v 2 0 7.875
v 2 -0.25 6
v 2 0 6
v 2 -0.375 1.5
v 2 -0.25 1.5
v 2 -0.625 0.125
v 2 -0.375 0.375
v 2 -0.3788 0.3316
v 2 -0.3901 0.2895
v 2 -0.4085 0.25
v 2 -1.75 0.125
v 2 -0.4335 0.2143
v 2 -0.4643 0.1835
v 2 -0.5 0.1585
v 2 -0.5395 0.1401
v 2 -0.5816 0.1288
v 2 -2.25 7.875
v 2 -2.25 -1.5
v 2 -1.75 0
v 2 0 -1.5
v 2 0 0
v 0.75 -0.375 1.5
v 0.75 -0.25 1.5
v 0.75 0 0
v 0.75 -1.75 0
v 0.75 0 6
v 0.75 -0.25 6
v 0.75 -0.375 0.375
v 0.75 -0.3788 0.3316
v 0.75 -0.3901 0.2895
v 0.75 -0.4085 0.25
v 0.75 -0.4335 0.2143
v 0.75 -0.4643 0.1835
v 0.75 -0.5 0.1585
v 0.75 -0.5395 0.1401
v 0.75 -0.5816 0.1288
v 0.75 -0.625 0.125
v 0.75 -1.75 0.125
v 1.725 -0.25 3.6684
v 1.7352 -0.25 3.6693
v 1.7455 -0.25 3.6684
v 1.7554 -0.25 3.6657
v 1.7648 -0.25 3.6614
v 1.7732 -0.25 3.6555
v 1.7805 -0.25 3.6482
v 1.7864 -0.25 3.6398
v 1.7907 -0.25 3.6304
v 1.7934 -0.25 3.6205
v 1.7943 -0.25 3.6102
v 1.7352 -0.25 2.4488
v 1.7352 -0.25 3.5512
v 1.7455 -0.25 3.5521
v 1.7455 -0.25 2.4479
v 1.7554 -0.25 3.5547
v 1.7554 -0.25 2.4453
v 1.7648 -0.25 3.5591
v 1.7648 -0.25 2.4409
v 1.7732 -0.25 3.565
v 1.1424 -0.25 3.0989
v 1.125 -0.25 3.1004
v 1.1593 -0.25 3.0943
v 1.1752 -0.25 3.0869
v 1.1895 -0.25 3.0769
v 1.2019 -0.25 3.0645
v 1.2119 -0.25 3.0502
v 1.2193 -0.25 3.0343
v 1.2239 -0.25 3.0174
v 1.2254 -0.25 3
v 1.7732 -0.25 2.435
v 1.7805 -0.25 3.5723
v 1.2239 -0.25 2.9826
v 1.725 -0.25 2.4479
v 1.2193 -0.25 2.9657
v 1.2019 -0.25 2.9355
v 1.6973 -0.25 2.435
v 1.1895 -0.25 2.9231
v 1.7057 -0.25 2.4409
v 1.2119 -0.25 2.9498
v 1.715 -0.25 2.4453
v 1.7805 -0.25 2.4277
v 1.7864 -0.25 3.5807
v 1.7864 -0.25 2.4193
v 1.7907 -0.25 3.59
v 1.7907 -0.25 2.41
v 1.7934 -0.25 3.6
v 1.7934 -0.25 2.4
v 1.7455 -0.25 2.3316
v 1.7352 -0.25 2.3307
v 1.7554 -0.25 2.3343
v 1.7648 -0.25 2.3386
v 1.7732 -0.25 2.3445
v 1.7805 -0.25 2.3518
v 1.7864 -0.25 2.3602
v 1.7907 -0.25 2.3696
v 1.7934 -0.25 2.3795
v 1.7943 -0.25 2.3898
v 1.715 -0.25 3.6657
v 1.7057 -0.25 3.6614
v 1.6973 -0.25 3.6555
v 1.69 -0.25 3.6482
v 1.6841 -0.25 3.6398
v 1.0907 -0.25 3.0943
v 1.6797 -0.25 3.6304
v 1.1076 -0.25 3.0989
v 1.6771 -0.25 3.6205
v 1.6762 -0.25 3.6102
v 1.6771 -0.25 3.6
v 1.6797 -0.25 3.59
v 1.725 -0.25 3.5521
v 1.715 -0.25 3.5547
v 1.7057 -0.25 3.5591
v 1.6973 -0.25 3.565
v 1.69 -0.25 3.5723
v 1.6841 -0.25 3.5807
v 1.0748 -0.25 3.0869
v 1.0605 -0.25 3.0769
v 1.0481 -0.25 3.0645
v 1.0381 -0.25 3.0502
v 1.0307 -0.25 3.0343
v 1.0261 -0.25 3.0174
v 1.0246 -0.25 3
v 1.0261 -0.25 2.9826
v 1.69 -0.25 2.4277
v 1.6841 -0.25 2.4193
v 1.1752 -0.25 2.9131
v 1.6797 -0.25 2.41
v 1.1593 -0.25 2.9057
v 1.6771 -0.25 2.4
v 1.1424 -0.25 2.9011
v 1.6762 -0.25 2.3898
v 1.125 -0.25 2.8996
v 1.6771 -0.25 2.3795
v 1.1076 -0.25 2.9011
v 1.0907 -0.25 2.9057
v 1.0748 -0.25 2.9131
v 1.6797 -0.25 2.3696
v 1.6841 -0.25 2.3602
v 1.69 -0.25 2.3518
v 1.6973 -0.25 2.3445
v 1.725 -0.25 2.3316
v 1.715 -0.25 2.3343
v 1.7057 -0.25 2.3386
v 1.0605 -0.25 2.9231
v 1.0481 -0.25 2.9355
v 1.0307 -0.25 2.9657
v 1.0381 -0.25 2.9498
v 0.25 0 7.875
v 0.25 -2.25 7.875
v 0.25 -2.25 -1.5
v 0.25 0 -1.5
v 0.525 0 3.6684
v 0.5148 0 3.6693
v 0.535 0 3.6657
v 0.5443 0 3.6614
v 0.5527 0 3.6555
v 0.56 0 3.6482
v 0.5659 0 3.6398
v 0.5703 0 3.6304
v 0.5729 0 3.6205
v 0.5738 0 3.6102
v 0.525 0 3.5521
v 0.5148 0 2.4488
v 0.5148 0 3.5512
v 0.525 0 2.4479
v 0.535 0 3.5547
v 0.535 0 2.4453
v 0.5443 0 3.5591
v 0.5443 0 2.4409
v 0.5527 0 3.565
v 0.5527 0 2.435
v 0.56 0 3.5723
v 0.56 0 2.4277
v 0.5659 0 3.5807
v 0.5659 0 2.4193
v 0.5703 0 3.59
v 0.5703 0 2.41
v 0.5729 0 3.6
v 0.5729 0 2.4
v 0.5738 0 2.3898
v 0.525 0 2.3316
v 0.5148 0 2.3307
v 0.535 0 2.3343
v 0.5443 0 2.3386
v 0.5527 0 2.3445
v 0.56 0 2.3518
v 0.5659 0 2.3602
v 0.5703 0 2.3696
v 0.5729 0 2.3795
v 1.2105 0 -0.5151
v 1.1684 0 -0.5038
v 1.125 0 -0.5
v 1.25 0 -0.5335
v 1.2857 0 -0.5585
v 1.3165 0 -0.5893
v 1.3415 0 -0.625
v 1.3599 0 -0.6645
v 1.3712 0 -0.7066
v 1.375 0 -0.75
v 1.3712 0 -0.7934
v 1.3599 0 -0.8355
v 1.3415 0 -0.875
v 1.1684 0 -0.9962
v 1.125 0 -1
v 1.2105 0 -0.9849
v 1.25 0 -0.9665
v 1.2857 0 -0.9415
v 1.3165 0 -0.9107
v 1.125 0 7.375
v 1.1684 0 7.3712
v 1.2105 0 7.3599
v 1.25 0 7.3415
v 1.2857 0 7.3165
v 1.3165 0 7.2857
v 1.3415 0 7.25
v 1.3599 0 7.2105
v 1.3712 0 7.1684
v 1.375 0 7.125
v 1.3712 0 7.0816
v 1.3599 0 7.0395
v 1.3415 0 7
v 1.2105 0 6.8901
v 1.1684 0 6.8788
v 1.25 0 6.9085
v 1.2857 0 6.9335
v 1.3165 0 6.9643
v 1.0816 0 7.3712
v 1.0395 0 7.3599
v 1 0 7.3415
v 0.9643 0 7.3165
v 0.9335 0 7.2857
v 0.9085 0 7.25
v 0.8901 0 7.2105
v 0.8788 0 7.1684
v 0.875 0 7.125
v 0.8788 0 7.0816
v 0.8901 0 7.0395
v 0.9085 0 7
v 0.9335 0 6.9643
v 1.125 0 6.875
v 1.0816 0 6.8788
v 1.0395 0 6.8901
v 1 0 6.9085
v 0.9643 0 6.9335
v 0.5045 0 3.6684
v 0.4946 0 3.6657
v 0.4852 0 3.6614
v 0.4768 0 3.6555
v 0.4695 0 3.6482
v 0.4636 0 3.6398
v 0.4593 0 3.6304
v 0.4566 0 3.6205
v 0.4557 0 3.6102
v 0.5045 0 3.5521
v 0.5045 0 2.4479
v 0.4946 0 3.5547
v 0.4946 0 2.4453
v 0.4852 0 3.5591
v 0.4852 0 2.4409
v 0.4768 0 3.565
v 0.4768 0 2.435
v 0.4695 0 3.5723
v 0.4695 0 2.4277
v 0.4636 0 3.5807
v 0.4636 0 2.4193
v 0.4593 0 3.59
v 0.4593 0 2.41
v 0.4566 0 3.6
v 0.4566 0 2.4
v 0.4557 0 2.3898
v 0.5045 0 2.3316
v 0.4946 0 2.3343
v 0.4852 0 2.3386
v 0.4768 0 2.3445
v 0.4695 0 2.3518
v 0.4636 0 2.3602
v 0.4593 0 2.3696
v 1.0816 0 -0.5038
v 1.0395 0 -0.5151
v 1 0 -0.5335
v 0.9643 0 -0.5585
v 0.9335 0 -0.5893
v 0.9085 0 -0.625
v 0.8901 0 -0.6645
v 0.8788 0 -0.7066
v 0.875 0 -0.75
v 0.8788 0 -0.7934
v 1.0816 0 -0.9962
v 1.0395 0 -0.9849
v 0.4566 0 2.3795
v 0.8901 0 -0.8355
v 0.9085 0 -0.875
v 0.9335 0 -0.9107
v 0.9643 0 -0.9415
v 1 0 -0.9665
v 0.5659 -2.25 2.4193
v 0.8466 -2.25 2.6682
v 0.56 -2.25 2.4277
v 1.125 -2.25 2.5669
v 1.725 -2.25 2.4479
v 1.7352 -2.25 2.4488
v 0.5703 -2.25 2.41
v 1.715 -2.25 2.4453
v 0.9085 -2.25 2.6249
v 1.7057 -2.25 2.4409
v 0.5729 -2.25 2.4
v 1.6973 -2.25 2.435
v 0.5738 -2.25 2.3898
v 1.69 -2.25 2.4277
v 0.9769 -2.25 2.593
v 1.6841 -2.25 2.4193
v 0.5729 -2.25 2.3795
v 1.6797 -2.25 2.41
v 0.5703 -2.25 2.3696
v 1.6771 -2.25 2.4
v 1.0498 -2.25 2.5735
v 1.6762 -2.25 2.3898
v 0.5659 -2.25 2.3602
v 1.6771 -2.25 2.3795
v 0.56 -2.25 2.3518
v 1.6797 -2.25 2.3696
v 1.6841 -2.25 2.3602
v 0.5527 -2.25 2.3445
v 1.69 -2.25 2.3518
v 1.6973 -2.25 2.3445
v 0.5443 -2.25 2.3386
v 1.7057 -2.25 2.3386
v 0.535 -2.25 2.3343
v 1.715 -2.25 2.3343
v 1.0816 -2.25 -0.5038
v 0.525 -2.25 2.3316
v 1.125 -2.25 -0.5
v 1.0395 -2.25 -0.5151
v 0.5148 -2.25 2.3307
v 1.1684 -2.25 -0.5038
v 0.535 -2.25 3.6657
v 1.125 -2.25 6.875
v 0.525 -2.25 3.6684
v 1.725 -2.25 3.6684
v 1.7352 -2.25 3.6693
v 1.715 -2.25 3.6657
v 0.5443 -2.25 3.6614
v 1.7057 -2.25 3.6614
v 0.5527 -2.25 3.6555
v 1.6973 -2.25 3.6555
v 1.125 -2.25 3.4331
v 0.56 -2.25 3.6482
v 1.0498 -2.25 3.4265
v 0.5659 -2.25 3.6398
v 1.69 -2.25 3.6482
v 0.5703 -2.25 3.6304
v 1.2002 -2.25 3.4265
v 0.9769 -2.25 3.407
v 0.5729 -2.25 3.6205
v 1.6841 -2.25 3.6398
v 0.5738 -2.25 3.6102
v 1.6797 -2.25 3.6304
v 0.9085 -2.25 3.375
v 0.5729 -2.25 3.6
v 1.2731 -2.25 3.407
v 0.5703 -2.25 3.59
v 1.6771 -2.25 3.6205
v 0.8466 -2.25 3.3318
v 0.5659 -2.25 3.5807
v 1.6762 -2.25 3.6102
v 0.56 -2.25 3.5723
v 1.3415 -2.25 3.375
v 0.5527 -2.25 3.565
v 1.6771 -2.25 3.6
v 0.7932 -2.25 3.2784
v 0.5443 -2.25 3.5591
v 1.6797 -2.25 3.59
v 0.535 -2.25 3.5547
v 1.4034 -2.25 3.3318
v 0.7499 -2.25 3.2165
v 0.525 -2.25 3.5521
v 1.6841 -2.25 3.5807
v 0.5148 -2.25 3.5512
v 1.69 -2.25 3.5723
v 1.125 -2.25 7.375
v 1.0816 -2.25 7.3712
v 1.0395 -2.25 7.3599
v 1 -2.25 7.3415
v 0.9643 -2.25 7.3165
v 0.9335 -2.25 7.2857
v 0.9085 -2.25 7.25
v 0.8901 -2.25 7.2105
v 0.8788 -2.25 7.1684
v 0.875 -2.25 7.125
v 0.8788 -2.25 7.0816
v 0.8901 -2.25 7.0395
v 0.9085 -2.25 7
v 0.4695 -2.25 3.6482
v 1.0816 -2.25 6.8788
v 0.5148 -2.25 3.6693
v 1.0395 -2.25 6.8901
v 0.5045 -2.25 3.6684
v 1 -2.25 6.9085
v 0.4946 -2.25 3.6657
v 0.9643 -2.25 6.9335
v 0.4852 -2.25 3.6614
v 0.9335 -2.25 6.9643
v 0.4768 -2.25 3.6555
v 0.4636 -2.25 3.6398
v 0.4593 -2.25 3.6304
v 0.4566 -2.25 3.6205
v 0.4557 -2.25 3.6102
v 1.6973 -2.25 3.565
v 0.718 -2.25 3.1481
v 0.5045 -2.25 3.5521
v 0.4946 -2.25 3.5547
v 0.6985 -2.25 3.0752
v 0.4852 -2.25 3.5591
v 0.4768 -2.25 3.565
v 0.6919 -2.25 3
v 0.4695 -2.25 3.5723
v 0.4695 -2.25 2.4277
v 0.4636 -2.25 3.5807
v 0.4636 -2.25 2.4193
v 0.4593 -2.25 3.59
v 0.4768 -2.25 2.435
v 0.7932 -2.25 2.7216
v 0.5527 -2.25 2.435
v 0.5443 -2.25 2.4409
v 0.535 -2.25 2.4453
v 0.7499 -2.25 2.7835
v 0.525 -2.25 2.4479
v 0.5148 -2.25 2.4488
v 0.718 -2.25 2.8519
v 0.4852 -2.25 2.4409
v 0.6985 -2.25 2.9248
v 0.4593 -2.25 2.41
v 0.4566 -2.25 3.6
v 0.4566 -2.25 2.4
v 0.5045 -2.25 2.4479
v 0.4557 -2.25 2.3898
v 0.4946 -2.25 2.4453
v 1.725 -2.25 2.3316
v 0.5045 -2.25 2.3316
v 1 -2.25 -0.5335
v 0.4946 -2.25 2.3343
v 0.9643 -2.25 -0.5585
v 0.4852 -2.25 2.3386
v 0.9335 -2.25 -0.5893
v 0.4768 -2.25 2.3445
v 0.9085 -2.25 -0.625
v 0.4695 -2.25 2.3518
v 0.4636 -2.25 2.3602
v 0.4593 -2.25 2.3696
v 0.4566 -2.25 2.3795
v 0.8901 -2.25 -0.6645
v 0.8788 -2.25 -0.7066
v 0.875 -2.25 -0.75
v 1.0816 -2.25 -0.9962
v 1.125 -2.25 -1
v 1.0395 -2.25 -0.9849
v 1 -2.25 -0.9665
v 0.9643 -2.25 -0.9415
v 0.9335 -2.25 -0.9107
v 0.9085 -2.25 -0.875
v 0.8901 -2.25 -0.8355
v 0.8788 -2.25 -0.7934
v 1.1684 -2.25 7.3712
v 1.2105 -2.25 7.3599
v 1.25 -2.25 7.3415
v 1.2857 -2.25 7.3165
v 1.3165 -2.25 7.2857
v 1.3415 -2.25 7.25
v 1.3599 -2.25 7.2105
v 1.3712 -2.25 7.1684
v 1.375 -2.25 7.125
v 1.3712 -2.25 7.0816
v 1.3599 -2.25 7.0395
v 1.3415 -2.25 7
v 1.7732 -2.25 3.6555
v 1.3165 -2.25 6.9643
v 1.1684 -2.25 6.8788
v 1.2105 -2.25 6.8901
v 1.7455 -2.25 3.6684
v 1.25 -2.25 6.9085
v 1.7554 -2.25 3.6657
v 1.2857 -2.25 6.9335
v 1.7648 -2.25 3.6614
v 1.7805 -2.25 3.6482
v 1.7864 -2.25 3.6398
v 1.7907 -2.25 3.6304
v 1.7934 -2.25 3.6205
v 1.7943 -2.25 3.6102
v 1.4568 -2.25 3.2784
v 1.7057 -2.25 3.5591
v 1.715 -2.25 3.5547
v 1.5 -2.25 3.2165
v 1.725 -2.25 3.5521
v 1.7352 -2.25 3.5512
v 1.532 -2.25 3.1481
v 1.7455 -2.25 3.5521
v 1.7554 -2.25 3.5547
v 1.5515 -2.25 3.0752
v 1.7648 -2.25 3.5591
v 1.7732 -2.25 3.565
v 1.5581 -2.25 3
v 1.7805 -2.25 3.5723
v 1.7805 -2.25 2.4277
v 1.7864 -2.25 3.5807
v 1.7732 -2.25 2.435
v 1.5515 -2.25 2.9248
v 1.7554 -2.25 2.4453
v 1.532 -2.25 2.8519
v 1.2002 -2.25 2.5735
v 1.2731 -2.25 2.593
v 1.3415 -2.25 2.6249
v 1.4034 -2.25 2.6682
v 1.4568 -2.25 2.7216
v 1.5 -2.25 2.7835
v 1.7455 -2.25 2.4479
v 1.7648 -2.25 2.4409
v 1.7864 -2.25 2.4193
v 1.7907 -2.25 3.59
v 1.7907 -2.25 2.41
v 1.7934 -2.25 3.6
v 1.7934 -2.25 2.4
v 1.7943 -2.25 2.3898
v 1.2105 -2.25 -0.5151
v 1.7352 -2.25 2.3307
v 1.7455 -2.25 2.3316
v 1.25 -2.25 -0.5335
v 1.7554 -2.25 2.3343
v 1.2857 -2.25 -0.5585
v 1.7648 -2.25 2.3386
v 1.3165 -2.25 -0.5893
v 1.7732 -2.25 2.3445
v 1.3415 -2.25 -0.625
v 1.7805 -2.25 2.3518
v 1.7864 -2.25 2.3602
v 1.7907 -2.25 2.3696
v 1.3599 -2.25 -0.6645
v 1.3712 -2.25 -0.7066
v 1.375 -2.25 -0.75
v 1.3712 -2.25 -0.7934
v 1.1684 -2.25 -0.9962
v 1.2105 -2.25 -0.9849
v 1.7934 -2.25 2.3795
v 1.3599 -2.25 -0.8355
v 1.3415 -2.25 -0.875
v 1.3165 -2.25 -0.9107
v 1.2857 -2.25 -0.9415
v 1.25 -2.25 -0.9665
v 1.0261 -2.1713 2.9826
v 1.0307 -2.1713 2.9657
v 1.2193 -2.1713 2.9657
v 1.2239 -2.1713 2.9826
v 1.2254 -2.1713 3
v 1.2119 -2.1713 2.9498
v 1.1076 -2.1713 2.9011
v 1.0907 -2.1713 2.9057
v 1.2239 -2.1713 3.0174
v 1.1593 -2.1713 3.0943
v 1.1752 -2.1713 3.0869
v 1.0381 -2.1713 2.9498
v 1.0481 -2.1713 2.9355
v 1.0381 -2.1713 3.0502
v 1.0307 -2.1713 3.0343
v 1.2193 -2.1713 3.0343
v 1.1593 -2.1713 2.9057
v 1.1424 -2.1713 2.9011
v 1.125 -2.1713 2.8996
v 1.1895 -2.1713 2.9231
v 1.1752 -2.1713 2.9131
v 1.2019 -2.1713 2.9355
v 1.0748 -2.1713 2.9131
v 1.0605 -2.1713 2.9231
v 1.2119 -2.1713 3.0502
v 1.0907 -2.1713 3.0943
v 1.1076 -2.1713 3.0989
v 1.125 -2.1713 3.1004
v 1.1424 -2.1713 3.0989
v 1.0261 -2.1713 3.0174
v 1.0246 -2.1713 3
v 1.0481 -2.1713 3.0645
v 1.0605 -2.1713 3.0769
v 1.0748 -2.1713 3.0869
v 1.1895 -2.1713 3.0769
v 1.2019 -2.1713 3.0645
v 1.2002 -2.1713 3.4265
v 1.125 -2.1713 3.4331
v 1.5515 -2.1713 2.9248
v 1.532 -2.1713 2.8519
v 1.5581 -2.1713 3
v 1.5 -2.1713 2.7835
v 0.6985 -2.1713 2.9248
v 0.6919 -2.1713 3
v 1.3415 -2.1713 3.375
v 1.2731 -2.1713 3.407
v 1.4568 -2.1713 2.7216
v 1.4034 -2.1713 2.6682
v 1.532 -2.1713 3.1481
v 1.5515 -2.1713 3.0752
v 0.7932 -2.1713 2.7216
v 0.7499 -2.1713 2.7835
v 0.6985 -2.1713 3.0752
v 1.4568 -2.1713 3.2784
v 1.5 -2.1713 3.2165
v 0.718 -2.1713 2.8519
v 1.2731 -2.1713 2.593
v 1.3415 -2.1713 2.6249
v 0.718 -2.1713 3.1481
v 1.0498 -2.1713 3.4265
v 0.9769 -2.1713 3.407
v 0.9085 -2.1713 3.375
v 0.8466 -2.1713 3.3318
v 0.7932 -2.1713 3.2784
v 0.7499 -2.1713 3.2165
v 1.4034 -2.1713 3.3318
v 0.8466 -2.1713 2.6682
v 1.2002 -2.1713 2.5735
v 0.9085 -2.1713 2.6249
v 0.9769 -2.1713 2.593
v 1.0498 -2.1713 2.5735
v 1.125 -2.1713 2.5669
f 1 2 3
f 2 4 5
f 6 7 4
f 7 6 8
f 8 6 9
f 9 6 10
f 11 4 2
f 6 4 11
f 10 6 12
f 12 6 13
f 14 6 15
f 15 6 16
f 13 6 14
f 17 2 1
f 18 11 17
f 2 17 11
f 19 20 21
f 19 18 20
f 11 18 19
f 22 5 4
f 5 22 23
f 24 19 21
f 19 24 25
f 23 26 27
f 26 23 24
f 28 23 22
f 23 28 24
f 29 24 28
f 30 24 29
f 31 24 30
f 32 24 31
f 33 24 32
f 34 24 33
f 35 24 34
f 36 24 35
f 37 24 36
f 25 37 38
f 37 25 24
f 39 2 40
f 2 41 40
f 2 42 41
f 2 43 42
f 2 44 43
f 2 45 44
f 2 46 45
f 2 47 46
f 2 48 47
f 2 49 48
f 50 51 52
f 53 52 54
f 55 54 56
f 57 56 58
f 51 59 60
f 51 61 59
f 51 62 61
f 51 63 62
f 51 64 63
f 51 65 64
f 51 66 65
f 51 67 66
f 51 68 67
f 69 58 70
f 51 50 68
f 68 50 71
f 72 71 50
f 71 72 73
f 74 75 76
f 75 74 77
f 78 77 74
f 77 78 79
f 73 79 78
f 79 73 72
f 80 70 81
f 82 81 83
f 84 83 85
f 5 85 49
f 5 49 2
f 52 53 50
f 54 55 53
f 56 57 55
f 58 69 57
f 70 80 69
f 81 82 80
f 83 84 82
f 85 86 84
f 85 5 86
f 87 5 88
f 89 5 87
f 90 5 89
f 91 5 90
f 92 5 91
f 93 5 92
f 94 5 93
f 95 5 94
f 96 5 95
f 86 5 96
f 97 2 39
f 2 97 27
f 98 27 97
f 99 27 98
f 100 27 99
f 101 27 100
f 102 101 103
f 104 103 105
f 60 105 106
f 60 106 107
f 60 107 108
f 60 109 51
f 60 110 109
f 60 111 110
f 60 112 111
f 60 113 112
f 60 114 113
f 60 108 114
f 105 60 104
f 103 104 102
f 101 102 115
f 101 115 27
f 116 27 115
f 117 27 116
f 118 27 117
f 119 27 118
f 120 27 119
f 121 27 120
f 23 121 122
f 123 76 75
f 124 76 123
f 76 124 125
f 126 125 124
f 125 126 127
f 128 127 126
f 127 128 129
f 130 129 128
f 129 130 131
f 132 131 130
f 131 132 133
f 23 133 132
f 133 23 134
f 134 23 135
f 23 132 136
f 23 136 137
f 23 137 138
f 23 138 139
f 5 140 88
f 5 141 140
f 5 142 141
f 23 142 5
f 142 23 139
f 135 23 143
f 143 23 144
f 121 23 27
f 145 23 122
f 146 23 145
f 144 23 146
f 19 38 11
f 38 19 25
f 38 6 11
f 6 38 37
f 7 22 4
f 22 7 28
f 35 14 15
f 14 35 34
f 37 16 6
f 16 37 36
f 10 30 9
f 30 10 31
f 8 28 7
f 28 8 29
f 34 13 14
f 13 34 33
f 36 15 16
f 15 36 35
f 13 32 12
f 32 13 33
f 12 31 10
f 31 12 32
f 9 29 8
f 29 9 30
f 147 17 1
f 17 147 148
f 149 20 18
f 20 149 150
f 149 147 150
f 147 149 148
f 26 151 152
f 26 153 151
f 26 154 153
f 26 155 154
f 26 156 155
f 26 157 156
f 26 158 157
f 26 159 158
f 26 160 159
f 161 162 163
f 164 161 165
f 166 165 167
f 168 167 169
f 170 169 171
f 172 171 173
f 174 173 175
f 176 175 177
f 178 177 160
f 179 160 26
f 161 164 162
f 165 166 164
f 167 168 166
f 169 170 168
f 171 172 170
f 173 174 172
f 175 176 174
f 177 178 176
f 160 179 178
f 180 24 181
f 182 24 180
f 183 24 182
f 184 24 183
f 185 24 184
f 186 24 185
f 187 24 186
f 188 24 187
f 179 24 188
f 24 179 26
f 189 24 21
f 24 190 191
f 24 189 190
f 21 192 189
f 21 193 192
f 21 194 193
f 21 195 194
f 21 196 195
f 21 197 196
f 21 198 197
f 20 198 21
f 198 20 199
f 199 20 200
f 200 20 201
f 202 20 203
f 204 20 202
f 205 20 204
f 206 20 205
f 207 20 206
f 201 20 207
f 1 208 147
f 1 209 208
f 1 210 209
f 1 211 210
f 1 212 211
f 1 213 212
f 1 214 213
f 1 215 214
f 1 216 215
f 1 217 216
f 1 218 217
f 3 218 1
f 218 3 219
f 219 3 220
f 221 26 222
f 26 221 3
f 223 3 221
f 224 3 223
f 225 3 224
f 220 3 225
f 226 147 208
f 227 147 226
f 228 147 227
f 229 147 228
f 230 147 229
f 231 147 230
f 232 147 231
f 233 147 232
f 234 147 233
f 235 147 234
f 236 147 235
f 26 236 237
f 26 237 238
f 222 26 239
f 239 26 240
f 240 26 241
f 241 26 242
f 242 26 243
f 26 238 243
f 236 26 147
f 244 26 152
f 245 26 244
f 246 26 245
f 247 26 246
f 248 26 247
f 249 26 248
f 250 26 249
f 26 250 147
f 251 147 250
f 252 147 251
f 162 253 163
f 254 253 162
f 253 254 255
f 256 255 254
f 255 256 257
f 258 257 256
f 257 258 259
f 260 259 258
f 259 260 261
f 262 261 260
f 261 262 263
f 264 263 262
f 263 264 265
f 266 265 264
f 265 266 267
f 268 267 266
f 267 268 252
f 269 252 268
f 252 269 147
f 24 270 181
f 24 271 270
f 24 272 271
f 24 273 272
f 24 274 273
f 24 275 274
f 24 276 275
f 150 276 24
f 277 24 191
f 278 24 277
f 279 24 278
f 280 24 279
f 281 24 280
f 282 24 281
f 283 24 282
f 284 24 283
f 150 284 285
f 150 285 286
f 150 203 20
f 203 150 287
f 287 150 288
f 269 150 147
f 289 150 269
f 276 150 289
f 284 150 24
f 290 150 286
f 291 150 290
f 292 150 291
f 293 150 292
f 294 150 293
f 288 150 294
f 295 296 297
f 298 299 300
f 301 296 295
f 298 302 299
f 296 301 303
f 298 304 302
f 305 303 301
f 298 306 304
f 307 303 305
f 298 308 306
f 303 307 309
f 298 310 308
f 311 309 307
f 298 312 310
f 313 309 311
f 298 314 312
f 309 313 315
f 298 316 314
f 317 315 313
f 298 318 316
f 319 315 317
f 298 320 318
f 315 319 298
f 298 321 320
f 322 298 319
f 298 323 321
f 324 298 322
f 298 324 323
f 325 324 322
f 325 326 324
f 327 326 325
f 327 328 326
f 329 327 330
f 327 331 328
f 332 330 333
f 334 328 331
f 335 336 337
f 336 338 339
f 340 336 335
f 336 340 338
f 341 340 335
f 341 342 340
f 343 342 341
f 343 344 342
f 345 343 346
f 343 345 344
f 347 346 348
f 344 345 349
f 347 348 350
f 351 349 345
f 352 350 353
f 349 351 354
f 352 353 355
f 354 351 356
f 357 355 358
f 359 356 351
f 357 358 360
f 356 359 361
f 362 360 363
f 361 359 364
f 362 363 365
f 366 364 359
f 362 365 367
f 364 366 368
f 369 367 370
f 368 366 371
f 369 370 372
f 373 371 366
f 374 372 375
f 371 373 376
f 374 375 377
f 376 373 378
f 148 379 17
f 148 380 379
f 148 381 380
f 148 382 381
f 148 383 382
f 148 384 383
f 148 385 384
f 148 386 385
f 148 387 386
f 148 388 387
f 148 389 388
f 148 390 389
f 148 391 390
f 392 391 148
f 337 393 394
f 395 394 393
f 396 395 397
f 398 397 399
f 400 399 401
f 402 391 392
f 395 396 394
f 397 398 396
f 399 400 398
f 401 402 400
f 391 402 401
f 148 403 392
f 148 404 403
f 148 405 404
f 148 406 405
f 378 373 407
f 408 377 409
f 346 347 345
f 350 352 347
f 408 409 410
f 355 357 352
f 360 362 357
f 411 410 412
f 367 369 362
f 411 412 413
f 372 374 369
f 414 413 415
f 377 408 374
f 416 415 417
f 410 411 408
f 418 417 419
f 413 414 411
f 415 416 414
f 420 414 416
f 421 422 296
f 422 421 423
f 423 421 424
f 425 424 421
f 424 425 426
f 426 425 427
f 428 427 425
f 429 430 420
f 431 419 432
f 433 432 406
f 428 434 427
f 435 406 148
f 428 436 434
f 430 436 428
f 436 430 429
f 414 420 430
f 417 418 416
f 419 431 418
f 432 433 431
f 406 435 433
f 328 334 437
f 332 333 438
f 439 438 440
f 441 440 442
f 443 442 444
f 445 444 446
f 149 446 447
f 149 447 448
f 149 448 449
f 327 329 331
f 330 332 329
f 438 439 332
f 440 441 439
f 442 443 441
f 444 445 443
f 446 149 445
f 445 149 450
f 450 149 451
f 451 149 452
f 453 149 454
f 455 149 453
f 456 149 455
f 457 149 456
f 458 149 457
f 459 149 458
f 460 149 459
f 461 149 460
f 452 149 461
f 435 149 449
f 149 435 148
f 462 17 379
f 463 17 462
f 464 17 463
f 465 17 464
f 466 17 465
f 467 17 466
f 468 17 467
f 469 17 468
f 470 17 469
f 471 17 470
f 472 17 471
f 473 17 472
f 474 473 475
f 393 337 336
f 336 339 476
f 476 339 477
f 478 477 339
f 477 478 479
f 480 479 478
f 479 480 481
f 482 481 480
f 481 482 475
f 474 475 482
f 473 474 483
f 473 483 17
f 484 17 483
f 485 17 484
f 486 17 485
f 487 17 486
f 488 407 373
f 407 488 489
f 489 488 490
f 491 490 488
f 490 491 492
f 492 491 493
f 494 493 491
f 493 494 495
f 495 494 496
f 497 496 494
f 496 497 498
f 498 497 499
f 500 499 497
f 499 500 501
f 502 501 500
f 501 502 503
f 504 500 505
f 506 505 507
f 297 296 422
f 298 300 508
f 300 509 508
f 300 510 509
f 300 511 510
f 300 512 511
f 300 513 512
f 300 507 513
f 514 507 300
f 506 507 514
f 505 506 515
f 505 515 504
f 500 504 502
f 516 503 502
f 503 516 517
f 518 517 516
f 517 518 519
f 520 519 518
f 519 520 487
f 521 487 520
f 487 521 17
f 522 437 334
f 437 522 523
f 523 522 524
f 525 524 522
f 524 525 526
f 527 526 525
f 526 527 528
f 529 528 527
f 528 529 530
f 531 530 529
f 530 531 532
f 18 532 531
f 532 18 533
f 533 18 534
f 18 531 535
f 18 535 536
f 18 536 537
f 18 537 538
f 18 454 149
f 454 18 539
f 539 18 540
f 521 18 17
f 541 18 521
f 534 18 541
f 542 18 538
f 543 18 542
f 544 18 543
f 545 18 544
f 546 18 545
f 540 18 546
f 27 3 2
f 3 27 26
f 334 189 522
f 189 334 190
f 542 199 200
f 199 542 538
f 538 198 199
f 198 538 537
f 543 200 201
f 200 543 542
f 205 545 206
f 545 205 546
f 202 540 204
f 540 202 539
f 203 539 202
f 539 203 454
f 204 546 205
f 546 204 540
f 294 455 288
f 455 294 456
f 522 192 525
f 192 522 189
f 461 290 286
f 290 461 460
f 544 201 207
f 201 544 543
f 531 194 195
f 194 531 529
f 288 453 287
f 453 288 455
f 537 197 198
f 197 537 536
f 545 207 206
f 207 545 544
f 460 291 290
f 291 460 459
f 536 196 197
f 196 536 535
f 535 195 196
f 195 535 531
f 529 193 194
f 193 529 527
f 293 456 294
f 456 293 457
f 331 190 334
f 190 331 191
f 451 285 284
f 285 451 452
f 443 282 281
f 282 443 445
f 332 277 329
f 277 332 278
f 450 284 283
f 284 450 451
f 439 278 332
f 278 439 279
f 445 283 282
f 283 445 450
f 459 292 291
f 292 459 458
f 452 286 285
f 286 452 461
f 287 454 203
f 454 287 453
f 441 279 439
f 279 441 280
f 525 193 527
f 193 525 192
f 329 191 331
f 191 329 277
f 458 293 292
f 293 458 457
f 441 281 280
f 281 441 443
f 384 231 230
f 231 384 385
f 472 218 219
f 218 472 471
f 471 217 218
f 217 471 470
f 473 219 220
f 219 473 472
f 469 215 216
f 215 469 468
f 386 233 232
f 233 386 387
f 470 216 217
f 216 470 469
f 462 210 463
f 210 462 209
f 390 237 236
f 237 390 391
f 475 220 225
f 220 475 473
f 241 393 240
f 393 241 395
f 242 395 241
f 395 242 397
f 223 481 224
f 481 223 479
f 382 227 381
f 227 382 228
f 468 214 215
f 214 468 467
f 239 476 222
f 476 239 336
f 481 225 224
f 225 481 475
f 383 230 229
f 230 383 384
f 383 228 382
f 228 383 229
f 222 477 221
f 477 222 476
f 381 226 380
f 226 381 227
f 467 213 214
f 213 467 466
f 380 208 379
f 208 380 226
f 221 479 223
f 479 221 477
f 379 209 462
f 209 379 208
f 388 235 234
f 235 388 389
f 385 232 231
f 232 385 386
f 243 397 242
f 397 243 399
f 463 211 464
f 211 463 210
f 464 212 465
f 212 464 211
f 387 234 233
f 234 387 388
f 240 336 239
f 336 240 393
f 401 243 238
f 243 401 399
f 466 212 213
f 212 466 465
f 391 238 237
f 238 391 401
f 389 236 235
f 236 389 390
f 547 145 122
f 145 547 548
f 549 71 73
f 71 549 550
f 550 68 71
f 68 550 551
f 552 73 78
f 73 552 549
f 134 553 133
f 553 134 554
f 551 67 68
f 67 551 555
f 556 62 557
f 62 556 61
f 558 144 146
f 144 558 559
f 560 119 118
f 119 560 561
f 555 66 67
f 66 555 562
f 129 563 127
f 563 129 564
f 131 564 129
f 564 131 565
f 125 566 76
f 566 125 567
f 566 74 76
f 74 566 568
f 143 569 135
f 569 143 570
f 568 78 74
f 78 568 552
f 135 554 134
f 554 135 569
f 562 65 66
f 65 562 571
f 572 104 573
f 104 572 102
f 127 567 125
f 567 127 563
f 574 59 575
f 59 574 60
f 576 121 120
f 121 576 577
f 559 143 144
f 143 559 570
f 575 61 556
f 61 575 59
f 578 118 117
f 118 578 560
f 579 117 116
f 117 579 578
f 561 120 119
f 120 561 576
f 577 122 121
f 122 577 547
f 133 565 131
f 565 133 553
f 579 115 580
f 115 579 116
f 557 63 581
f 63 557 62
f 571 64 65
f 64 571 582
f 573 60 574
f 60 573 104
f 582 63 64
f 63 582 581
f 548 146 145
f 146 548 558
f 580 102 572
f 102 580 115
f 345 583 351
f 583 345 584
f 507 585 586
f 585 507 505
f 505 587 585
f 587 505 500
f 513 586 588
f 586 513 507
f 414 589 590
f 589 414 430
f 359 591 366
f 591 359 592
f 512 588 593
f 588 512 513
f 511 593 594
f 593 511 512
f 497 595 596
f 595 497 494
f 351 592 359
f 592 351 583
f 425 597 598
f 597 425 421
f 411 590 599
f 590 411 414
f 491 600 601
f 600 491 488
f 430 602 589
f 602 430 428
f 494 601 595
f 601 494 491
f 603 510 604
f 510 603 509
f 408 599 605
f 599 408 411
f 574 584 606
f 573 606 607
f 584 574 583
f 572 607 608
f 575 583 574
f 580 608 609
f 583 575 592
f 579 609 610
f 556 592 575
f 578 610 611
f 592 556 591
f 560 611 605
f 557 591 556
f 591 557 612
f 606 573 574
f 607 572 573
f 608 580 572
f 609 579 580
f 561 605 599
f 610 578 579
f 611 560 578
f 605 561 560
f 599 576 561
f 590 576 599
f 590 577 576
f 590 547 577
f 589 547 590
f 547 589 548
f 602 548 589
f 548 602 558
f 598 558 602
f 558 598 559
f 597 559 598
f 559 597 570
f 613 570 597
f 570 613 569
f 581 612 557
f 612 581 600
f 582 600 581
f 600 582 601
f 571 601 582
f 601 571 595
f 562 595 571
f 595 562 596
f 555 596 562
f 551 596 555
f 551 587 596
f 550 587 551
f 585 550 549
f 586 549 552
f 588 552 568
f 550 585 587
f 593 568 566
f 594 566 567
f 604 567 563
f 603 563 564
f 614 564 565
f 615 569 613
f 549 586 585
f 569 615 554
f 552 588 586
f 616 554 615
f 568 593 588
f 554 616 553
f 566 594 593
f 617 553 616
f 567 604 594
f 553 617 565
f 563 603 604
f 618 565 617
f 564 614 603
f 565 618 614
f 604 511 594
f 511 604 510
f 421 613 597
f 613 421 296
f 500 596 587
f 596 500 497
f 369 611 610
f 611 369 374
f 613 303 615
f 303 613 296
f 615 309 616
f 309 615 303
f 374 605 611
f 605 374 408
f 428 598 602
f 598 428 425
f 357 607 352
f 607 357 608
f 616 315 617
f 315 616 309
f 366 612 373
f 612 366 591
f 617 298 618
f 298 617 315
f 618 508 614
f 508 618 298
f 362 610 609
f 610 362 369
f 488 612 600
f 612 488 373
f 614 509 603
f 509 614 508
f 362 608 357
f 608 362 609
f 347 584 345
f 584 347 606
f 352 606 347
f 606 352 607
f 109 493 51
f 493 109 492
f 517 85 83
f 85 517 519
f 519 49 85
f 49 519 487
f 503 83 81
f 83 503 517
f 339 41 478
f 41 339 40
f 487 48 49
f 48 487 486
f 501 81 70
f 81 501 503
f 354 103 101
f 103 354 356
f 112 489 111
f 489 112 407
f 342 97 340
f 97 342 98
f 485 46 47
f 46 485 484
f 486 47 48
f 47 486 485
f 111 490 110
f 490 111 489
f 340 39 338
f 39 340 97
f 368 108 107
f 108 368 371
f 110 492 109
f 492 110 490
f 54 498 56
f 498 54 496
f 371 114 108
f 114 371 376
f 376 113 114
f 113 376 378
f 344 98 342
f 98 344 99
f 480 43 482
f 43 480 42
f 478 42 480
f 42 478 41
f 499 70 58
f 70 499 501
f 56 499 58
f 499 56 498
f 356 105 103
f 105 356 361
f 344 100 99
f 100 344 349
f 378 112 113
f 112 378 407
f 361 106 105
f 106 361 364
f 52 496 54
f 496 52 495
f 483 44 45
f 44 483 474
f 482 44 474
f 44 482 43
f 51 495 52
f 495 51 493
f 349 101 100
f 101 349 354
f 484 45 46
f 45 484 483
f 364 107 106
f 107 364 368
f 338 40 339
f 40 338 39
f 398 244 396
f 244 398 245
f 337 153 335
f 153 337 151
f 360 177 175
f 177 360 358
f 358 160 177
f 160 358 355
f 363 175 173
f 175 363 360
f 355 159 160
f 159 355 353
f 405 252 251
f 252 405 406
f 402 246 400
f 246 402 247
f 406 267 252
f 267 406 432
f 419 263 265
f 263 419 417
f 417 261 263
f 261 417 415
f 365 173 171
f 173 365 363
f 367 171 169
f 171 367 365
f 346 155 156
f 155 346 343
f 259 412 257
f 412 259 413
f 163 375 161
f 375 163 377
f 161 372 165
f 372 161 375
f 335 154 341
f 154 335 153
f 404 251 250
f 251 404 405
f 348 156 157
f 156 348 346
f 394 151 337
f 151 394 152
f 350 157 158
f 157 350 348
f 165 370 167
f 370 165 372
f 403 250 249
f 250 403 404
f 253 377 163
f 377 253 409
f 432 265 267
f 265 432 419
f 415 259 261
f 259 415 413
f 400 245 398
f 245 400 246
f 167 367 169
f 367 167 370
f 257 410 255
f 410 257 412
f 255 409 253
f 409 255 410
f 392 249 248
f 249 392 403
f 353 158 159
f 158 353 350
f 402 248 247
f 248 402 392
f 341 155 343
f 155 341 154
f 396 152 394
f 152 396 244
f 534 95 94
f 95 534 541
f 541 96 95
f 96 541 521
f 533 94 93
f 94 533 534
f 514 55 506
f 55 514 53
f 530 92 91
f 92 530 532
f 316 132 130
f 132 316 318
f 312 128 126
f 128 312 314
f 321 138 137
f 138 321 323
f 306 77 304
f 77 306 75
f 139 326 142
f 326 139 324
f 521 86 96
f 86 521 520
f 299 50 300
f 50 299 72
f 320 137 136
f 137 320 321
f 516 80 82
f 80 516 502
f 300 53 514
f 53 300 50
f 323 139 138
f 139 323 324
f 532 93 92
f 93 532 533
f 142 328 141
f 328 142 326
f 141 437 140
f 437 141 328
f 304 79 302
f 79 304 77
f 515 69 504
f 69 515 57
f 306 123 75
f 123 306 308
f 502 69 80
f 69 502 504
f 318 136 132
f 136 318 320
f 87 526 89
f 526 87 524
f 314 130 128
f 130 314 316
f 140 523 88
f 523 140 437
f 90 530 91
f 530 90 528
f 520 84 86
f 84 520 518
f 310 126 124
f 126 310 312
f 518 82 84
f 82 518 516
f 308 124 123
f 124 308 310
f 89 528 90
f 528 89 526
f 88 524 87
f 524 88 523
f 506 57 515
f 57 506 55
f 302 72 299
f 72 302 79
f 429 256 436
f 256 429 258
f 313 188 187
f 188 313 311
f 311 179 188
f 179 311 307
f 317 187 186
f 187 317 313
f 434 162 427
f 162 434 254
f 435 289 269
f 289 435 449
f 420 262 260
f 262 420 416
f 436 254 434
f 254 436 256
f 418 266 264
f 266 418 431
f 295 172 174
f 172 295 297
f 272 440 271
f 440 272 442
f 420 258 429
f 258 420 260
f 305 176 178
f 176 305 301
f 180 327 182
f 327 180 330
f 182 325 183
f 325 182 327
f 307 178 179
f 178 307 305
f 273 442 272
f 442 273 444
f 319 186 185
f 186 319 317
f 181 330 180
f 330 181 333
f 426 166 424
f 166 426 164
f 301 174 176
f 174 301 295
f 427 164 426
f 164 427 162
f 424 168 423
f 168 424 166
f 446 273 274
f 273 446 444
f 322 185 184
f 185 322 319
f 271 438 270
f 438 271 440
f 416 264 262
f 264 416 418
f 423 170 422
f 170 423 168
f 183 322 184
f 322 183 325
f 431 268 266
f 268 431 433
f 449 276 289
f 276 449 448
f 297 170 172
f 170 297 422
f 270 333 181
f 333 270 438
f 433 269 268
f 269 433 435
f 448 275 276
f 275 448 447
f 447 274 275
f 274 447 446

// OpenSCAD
// file: TTvars.scad
barX=0.25;
barZ=6;
barLY=108;
barLX=60;

angX=1.5;
angT=0.125;
angLY=barLY;
angLX=barLX;
angR=0.25;

boltD=0.5;   // 6mm
boltL=1.968504;    // 50mm

brrOD=0.875;
brrID=0.375;
brrT=0.28125;

sprOD=0.25;

bmountGap=0.125;
bmountbrrGap=0.125;

stepBoltD=0.11811024;  //3.0mm bolt diameter
stepBoltHD=0.22362205; //5.68mm head diameter
stepBoltHH=0.11811024;  //3.0mm head height
stepBoltX=1.22047244;   //31.0mm square from bolt center to center
stepBoltIn=0.15748031;  //4.0mm bolt depth into stepper
stepSeatD=0.86614173;    //22.0mm
stepSeatH=0.07874016;    //2.0mm
stepX=1.66535433;        //42.3mm stepper square face 
stepBoreD=0.2007874;     //5.1mm shaft bore
stepBoreL=0.94488189;    //24mm

pullP=1.253;       //OD of belt around pully GT2 20T ??
pullH=0;            //Height of pulley

$fn=36;

//calculated

Y2Y=barLX+0.5;
X2X=8; //distance between X rails

bmountX=barX+((brrOD+1)*2);
bmountY=X2X;
bmountZ=barZ+(1+boltD)+(brrOD/2)+(brrID/2)+(0.25)+boltD+(0.5);
// main file
include <TTvars.scad>;

TTxmount();

//need to add stepper motor mounting holes or idler


module TTxmount(){
difference(){    
translate([(barX+(bmountGap*2))/2,-(angX+0.75),-(1+boltD)])
cube([((bmountX-(barX+(bmountGap*2)))/2),angX+0.75,bmountZ]);    
    translate([(((barX+(bmountGap*2)))/2)+0.5,-barX,0])
cube([((bmountX-(barX+(bmountGap*2)))/2)-0.5,barX,barZ]);

translate([(((barX+(bmountGap*2)))/2)+0.5,-barX-angX,0])
difference(){
    cube([((bmountX-(barX+(bmountGap*2)))/2)-0.5,angX,angX]);
    translate([0,-angT,angT])
    cube([((bmountX-(barX+(bmountGap*2)))/2)-0.5,angX,angX]);
}


translate([(((barX+(bmountGap*2)))/2)+0.5,-barX-angX,0])
translate([0,angX-angR-angT,angT])
difference(){
cube([((bmountX-(barX+(bmountGap*2)))/2)-0.5,angR,angR]);
    translate([0,0,angR])
    rotate([0,90,0])
    cylinder(r=angR,h=((bmountX-(barX+(bmountGap*2)))/2)-0.5,$fn=36);

} //end difference    

translate([bmountX-(((bmountX-(barX+(bmountGap*2)))/2)/2)-(bmountX/2),-(angX+0.75),-(1+boltD)/2])
rotate([-90,0,0])
    cylinder(d=boltD, h=(angX+0.75));
translate([bmountX-(((bmountX-(barX+(bmountGap*2)))/2)/2)-(bmountX/2),-(angX+0.75),barZ+(brrOD/2)+(brrID/2)+(0.25)+(boltD/2)])
rotate([-90,0,0])
    cylinder(d=boltD, h=(angX+0.75));
    
//stepper

//bore
translate([bmountX-(((bmountX-(barX+(bmountGap*2)))/2)/2)-(bmountX/2),-(angX+0.75),barZ/2])
rotate([270,0,0])
cylinder(d=stepBoreD,h=angX+0.75);

//translate([bmountX-(((bmountX-(barX+(bmountGap*2)))/2)/2)-(bmountX/2),-(angX+0.75),barZ/2])
//rotate([270,0,0])
//cylinder(d=pullP,h=angX+0.75);

translate([bmountX-(((bmountX-(barX+(bmountGap*2)))/2)/2)-(bmountX/2),-(angX+0.75),barZ/2])
rotate([270,0,0])
cylinder(d=stepSeatD,h=stepSeatH);

translate([bmountX-(((bmountX-(barX+(bmountGap*2)))/2)/2)-(bmountX/2)+(stepBoltX/2),-(angX+0.75),(barZ/2)+(stepBoltX/2)])
rotate([270,0,0])
cylinder(d=stepBoltD,h=angX+0.75);
translate([bmountX-(((bmountX-(barX+(bmountGap*2)))/2)/2)-(bmountX/2)-(stepBoltX/2),-(angX+0.75),(barZ/2)+(stepBoltX/2)])
rotate([270,0,0])
cylinder(d=stepBoltD,h=angX+0.75);
translate([bmountX-(((bmountX-(barX+(bmountGap*2)))/2)/2)-(bmountX/2)+(stepBoltX/2),-(angX+0.75),(barZ/2)-(stepBoltX/2)])
rotate([270,0,0])
cylinder(d=stepBoltD,h=angX+0.75);
translate([bmountX-(((bmountX-(barX+(bmountGap*2)))/2)/2)-(bmountX/2)-(stepBoltX/2),-(angX+0.75),(barZ/2)-(stepBoltX/2)])
rotate([270,0,0])
cylinder(d=stepBoltD,h=angX+0.75);


} //end difference
} //end TTxmount
